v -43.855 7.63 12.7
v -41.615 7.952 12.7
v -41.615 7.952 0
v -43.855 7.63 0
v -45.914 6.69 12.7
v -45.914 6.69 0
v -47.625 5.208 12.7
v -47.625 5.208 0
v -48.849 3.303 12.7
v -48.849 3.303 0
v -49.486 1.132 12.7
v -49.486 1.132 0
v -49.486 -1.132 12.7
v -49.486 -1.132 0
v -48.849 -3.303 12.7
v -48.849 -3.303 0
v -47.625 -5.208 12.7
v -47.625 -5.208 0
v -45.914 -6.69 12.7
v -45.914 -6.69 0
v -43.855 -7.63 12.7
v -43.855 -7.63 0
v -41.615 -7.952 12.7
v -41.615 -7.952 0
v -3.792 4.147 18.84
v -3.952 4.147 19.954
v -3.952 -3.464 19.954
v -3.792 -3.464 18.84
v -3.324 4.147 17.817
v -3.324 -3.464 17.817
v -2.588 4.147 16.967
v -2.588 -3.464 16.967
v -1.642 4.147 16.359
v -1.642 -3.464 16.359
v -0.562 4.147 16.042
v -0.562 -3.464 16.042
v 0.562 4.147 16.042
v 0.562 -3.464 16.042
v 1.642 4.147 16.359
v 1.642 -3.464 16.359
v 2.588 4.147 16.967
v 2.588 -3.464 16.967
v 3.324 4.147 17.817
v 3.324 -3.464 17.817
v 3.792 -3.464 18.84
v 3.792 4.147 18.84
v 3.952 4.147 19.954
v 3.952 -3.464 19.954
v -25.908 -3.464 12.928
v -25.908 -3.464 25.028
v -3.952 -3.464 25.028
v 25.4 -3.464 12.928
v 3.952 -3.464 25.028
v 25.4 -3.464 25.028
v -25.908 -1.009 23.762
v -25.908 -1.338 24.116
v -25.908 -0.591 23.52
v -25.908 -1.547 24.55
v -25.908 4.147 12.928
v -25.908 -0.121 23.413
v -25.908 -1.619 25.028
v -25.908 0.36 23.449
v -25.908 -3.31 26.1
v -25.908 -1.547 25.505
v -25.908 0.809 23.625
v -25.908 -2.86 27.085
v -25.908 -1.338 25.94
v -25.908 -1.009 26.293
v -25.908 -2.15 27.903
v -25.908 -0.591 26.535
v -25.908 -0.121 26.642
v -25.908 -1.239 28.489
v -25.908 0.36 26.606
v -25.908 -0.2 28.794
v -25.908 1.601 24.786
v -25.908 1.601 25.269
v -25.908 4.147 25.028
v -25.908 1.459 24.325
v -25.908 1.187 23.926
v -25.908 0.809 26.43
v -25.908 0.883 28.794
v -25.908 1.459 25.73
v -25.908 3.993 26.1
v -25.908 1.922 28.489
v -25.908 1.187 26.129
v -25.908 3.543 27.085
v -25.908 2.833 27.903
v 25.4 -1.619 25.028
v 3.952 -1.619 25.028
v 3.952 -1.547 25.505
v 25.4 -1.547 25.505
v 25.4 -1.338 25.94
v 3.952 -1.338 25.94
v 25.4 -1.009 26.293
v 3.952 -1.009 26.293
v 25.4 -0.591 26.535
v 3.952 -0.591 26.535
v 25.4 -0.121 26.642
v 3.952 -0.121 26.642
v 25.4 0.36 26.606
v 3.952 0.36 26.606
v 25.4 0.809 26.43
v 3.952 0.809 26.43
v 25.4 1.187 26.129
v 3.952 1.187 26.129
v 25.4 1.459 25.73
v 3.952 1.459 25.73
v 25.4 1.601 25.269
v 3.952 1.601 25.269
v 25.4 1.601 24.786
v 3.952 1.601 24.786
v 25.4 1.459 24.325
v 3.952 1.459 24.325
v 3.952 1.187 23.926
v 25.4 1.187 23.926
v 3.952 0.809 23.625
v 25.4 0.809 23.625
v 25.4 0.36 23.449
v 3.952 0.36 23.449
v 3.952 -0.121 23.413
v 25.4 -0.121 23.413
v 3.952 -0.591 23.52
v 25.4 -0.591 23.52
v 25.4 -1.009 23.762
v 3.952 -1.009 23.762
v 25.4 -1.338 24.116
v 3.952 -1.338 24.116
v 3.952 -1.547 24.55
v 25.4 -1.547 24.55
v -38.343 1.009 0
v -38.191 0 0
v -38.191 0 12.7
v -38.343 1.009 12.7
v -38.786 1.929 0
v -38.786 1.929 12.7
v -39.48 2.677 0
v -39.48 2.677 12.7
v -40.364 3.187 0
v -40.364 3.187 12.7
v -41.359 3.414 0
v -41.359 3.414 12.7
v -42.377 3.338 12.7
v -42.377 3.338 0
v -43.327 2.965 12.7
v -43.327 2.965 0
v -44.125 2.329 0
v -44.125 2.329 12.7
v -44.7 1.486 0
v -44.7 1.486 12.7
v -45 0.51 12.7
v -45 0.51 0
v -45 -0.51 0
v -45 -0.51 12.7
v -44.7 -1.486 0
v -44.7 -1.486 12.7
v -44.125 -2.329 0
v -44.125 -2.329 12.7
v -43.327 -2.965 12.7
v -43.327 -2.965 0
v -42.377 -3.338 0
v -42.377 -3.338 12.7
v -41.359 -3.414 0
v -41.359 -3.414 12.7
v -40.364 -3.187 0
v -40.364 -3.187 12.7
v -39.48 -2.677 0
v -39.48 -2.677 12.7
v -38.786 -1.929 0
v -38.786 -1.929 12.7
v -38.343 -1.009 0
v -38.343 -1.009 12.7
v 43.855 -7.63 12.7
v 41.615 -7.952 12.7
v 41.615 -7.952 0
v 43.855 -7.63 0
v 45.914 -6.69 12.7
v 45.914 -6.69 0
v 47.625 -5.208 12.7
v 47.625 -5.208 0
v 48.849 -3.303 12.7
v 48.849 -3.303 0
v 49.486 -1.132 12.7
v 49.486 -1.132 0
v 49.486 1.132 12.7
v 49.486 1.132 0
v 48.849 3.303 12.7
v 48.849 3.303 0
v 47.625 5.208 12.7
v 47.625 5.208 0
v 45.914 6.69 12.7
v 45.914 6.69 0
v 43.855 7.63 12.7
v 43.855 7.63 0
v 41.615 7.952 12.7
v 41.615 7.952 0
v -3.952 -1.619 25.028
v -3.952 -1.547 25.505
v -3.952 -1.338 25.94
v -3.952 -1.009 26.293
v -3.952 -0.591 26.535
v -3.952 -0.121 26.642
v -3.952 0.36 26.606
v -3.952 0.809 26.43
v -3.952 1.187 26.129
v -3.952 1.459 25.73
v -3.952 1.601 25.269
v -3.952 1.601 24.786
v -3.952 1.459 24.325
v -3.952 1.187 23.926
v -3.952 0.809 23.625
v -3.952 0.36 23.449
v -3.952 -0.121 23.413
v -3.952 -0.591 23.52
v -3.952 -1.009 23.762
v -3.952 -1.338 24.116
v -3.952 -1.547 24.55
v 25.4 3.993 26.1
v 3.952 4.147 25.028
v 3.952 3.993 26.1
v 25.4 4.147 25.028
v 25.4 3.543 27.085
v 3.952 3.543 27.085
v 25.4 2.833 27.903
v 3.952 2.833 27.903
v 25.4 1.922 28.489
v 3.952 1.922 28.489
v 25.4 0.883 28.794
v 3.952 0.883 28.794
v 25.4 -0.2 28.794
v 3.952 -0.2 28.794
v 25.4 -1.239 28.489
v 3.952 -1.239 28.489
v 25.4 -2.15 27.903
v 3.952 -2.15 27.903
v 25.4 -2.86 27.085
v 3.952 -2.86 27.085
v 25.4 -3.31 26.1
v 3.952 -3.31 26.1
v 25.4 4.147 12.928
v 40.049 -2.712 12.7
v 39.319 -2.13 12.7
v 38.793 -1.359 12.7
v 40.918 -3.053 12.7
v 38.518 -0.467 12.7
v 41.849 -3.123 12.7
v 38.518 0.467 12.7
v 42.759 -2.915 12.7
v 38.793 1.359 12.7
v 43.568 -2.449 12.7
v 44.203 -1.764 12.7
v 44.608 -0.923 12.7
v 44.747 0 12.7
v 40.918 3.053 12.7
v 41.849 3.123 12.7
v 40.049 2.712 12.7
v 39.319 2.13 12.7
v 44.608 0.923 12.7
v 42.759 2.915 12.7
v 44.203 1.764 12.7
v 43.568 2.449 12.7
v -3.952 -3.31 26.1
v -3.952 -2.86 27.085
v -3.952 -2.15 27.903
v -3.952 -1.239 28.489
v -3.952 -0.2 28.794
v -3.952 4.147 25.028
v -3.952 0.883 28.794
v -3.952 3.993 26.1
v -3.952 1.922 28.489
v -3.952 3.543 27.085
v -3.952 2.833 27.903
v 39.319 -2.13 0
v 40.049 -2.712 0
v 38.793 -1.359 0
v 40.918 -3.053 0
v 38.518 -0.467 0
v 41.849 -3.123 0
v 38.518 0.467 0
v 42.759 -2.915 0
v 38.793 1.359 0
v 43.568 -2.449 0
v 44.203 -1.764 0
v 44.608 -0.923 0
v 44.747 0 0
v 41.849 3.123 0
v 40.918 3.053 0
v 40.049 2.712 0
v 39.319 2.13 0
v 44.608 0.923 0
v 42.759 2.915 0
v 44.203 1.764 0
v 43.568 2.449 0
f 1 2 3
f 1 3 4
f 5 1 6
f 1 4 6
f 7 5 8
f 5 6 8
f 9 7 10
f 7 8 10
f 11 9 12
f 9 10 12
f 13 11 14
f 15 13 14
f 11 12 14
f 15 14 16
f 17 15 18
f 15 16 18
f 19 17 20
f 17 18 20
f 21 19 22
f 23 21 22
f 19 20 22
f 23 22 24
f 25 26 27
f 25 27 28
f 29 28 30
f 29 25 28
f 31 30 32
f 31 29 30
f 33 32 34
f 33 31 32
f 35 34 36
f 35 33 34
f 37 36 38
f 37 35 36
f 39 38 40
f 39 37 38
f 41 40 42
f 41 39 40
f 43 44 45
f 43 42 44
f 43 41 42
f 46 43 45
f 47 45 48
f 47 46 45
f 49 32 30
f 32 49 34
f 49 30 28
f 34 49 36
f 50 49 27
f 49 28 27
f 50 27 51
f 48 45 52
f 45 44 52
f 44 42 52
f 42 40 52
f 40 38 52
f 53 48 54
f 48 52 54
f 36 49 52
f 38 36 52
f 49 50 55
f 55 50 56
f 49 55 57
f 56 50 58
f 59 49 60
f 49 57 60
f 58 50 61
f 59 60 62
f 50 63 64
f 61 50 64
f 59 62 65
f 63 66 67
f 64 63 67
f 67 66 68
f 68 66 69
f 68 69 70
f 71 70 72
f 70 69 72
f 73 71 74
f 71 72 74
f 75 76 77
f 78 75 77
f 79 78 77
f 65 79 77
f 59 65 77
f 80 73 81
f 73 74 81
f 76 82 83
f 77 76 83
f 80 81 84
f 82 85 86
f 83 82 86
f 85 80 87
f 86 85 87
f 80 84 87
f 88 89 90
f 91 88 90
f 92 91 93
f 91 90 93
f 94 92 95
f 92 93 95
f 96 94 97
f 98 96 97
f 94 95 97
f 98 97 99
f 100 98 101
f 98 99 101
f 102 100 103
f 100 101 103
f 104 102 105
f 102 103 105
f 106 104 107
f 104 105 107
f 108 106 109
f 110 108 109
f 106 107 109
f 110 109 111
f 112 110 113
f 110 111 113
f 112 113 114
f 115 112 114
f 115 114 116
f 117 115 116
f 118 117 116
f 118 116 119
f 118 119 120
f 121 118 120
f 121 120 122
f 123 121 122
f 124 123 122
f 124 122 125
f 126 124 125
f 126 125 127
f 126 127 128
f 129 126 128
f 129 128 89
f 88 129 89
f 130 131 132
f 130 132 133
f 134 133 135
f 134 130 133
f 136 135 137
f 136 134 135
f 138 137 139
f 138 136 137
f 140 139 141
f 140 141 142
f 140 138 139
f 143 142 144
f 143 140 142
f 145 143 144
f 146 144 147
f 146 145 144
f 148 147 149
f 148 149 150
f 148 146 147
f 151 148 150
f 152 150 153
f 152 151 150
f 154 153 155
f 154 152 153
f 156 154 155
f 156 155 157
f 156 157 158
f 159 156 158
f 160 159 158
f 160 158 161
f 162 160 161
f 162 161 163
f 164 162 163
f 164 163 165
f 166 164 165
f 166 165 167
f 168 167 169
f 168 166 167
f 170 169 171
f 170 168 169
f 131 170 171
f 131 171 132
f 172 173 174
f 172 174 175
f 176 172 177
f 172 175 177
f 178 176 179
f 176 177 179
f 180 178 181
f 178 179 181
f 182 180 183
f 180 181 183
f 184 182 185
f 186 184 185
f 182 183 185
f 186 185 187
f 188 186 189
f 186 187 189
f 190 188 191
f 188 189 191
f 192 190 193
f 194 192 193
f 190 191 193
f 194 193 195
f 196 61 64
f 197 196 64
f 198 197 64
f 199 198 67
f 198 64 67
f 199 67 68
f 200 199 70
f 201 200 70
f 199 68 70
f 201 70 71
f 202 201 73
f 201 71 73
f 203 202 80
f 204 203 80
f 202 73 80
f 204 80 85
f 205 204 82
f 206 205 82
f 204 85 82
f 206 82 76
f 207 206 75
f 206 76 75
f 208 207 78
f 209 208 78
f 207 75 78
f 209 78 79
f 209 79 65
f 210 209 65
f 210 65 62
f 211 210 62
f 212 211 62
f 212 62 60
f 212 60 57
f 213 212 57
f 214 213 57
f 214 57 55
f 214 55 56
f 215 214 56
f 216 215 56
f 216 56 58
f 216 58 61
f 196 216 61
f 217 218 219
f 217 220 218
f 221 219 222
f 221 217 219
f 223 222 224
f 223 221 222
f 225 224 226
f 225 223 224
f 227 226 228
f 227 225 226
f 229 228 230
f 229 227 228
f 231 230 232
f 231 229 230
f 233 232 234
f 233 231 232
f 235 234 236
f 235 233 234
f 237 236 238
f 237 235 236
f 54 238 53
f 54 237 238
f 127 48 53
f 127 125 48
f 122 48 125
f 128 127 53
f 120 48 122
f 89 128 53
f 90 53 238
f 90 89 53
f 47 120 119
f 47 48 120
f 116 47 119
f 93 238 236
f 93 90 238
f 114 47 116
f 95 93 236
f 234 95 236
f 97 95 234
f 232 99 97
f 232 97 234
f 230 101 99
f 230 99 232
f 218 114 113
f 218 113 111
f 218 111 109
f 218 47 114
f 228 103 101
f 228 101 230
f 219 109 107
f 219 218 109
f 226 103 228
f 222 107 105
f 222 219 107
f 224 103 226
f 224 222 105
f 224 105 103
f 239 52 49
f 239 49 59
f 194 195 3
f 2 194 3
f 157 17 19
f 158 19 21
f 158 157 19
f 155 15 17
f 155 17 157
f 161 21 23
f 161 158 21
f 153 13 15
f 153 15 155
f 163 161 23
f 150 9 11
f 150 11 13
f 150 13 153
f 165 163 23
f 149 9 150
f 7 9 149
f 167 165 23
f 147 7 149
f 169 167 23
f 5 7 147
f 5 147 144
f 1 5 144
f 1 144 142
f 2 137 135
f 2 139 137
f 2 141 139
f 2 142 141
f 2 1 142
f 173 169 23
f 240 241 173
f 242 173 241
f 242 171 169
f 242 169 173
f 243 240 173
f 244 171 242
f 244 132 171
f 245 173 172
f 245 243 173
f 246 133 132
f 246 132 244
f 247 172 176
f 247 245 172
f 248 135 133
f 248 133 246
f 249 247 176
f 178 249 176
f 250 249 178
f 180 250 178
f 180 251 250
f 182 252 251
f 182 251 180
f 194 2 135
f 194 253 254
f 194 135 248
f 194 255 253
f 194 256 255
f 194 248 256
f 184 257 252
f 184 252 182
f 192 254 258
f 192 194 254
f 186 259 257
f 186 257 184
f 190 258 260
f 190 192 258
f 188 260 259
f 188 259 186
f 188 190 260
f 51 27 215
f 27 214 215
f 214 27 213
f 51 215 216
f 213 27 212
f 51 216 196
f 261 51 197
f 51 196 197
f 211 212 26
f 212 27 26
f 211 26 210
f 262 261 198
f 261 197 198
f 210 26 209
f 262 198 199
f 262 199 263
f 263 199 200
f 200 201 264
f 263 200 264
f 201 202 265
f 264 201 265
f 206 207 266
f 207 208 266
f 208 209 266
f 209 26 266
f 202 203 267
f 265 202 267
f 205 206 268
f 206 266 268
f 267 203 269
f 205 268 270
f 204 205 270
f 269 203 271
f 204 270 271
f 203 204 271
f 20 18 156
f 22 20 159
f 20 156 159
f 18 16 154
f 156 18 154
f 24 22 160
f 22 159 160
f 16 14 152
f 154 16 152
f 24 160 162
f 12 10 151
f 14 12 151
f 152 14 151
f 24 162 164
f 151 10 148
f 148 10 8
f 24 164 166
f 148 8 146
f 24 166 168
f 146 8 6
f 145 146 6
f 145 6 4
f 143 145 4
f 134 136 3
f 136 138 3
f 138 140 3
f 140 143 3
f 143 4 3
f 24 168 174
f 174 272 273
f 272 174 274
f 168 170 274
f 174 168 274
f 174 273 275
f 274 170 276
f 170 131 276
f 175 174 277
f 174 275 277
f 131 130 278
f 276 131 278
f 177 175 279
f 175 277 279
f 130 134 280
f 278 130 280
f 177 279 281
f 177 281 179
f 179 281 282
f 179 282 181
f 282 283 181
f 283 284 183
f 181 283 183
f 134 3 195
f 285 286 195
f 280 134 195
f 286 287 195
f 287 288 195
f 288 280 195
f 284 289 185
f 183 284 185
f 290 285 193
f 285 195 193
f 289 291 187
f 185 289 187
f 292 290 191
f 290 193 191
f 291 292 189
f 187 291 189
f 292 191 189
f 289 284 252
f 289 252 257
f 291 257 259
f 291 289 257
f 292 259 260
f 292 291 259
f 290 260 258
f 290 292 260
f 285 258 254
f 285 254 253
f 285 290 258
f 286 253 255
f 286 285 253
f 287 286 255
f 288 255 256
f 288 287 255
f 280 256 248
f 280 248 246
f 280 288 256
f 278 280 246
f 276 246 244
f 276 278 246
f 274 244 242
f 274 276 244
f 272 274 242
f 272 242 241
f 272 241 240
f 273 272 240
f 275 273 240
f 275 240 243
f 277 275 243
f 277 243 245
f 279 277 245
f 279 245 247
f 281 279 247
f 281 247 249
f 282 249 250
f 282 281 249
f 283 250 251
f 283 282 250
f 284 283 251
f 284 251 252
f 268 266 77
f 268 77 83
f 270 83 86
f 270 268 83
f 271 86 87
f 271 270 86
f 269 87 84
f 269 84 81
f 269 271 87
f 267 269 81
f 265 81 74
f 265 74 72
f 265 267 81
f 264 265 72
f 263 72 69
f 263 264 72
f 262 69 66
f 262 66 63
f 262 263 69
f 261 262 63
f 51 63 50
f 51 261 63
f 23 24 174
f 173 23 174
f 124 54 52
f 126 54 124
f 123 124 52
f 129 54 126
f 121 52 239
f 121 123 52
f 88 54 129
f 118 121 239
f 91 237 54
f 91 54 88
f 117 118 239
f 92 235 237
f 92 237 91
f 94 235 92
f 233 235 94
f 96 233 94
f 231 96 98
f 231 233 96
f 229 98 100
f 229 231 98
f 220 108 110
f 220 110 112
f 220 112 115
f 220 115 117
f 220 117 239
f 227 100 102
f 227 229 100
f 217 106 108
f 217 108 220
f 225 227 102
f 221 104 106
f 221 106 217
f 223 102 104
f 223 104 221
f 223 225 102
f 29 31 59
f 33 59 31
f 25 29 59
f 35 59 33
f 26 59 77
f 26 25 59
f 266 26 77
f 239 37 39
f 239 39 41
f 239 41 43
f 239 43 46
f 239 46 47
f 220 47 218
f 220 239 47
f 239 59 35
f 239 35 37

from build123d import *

# Parameters (mm, degrees)
F0_R     = 3.423764
F0_R_2   = 3.131855
F1_DEPTH = 12.7
F2_W     = 7.610706
F2_H     = 12.099074
F3_DEPTH = 25.4
F4_DEPTH = 25.908
F5_R     = 1.618996
F6_DEPTH = 55.88
F7_W     = 7.903422
F7_H     = 22.246681
F8_DEPTH = 25.4
F9_DEPTH = 20.828


with BuildPart() as f1:
    # F0 (on Top) → F1 (new body)
    with BuildSketch(Plane.XY):
        with BuildLine():
            Line((-41.614961, -7.952213), (41.614961, -7.952213))
            ThreePointArc((41.614961, -7.952213), (49.567174, 0), (41.614961, 7.952213))
            Line((41.614961, 7.952213), (-41.614961, 7.952213))
            ThreePointArc((-41.614961, 7.952213), (-49.567174, 0), (-41.614961, -7.952213))
        make_face()
        with Locations((-41.614961, 0)):
            Circle(F0_R, mode=Mode.SUBTRACT)
        with Locations((41.614961, 0)):
            Circle(F0_R_2, mode=Mode.SUBTRACT)
    extrude(amount=F1_DEPTH)


with BuildPart() as f3:
    # F2 (on Right) → F3 (new body)
    with BuildSketch(Plane.YZ):
        with Locations((0.341506, 18.977982)):
            Rectangle(F2_W, F2_H)
        with BuildLine():
            ThreePointArc((4.146859, 25.027519), (0.341506, 28.832872), (-3.463847, 25.027519))
            Line((-3.463847, 25.027519), (4.146859, 25.027519))
        make_face()
    extrude(amount=F3_DEPTH)

    # F2 (on Right) → F4 (join)
    with BuildSketch(Plane.YZ):
        with Locations((0.341506, 18.977982)):
            Rectangle(F2_W, F2_H)
        with BuildLine():
            ThreePointArc((4.146859, 25.027519), (0.341506, 28.832872), (-3.463847, 25.027519))
            Line((-3.463847, 25.027519), (4.146859, 25.027519))
        make_face()
    extrude(amount=-F4_DEPTH)

    # F5 (on face) → F6 (cut)
    with BuildSketch(Plane(origin=(-25.908, 0, 0), x_dir=(0, -1, 0), z_dir=(-1, 0, 0))):
        with Locations((0, 25.027519)):
            Circle(F5_R)
    extrude(amount=-F6_DEPTH, mode=Mode.SUBTRACT)

    # F7 (on Front) → F8 (cut)
    with BuildSketch(Plane.XZ):
        with BuildLine():
            ThreePointArc((-3.951711, 19.953713), (0, 16.002002), (3.951711, 19.953713))
            Line((3.951711, 19.953713), (-3.951711, 19.953713))
        make_face()
        with Locations((0, 31.077053)):
            Rectangle(F7_W, F7_H)
    extrude(amount=-F8_DEPTH, mode=Mode.SUBTRACT)

    # F7 (on Front) → F9 (cut)
    with BuildSketch(Plane.XZ):
        with BuildLine():
            ThreePointArc((-3.951711, 19.953713), (0, 16.002002), (3.951711, 19.953713))
            Line((3.951711, 19.953713), (-3.951711, 19.953713))
        make_face()
        with Locations((0, 31.077053)):
            Rectangle(F7_W, F7_H)
    extrude(amount=F9_DEPTH, mode=Mode.SUBTRACT)


solid = Compound([f1.part, f3.part])
